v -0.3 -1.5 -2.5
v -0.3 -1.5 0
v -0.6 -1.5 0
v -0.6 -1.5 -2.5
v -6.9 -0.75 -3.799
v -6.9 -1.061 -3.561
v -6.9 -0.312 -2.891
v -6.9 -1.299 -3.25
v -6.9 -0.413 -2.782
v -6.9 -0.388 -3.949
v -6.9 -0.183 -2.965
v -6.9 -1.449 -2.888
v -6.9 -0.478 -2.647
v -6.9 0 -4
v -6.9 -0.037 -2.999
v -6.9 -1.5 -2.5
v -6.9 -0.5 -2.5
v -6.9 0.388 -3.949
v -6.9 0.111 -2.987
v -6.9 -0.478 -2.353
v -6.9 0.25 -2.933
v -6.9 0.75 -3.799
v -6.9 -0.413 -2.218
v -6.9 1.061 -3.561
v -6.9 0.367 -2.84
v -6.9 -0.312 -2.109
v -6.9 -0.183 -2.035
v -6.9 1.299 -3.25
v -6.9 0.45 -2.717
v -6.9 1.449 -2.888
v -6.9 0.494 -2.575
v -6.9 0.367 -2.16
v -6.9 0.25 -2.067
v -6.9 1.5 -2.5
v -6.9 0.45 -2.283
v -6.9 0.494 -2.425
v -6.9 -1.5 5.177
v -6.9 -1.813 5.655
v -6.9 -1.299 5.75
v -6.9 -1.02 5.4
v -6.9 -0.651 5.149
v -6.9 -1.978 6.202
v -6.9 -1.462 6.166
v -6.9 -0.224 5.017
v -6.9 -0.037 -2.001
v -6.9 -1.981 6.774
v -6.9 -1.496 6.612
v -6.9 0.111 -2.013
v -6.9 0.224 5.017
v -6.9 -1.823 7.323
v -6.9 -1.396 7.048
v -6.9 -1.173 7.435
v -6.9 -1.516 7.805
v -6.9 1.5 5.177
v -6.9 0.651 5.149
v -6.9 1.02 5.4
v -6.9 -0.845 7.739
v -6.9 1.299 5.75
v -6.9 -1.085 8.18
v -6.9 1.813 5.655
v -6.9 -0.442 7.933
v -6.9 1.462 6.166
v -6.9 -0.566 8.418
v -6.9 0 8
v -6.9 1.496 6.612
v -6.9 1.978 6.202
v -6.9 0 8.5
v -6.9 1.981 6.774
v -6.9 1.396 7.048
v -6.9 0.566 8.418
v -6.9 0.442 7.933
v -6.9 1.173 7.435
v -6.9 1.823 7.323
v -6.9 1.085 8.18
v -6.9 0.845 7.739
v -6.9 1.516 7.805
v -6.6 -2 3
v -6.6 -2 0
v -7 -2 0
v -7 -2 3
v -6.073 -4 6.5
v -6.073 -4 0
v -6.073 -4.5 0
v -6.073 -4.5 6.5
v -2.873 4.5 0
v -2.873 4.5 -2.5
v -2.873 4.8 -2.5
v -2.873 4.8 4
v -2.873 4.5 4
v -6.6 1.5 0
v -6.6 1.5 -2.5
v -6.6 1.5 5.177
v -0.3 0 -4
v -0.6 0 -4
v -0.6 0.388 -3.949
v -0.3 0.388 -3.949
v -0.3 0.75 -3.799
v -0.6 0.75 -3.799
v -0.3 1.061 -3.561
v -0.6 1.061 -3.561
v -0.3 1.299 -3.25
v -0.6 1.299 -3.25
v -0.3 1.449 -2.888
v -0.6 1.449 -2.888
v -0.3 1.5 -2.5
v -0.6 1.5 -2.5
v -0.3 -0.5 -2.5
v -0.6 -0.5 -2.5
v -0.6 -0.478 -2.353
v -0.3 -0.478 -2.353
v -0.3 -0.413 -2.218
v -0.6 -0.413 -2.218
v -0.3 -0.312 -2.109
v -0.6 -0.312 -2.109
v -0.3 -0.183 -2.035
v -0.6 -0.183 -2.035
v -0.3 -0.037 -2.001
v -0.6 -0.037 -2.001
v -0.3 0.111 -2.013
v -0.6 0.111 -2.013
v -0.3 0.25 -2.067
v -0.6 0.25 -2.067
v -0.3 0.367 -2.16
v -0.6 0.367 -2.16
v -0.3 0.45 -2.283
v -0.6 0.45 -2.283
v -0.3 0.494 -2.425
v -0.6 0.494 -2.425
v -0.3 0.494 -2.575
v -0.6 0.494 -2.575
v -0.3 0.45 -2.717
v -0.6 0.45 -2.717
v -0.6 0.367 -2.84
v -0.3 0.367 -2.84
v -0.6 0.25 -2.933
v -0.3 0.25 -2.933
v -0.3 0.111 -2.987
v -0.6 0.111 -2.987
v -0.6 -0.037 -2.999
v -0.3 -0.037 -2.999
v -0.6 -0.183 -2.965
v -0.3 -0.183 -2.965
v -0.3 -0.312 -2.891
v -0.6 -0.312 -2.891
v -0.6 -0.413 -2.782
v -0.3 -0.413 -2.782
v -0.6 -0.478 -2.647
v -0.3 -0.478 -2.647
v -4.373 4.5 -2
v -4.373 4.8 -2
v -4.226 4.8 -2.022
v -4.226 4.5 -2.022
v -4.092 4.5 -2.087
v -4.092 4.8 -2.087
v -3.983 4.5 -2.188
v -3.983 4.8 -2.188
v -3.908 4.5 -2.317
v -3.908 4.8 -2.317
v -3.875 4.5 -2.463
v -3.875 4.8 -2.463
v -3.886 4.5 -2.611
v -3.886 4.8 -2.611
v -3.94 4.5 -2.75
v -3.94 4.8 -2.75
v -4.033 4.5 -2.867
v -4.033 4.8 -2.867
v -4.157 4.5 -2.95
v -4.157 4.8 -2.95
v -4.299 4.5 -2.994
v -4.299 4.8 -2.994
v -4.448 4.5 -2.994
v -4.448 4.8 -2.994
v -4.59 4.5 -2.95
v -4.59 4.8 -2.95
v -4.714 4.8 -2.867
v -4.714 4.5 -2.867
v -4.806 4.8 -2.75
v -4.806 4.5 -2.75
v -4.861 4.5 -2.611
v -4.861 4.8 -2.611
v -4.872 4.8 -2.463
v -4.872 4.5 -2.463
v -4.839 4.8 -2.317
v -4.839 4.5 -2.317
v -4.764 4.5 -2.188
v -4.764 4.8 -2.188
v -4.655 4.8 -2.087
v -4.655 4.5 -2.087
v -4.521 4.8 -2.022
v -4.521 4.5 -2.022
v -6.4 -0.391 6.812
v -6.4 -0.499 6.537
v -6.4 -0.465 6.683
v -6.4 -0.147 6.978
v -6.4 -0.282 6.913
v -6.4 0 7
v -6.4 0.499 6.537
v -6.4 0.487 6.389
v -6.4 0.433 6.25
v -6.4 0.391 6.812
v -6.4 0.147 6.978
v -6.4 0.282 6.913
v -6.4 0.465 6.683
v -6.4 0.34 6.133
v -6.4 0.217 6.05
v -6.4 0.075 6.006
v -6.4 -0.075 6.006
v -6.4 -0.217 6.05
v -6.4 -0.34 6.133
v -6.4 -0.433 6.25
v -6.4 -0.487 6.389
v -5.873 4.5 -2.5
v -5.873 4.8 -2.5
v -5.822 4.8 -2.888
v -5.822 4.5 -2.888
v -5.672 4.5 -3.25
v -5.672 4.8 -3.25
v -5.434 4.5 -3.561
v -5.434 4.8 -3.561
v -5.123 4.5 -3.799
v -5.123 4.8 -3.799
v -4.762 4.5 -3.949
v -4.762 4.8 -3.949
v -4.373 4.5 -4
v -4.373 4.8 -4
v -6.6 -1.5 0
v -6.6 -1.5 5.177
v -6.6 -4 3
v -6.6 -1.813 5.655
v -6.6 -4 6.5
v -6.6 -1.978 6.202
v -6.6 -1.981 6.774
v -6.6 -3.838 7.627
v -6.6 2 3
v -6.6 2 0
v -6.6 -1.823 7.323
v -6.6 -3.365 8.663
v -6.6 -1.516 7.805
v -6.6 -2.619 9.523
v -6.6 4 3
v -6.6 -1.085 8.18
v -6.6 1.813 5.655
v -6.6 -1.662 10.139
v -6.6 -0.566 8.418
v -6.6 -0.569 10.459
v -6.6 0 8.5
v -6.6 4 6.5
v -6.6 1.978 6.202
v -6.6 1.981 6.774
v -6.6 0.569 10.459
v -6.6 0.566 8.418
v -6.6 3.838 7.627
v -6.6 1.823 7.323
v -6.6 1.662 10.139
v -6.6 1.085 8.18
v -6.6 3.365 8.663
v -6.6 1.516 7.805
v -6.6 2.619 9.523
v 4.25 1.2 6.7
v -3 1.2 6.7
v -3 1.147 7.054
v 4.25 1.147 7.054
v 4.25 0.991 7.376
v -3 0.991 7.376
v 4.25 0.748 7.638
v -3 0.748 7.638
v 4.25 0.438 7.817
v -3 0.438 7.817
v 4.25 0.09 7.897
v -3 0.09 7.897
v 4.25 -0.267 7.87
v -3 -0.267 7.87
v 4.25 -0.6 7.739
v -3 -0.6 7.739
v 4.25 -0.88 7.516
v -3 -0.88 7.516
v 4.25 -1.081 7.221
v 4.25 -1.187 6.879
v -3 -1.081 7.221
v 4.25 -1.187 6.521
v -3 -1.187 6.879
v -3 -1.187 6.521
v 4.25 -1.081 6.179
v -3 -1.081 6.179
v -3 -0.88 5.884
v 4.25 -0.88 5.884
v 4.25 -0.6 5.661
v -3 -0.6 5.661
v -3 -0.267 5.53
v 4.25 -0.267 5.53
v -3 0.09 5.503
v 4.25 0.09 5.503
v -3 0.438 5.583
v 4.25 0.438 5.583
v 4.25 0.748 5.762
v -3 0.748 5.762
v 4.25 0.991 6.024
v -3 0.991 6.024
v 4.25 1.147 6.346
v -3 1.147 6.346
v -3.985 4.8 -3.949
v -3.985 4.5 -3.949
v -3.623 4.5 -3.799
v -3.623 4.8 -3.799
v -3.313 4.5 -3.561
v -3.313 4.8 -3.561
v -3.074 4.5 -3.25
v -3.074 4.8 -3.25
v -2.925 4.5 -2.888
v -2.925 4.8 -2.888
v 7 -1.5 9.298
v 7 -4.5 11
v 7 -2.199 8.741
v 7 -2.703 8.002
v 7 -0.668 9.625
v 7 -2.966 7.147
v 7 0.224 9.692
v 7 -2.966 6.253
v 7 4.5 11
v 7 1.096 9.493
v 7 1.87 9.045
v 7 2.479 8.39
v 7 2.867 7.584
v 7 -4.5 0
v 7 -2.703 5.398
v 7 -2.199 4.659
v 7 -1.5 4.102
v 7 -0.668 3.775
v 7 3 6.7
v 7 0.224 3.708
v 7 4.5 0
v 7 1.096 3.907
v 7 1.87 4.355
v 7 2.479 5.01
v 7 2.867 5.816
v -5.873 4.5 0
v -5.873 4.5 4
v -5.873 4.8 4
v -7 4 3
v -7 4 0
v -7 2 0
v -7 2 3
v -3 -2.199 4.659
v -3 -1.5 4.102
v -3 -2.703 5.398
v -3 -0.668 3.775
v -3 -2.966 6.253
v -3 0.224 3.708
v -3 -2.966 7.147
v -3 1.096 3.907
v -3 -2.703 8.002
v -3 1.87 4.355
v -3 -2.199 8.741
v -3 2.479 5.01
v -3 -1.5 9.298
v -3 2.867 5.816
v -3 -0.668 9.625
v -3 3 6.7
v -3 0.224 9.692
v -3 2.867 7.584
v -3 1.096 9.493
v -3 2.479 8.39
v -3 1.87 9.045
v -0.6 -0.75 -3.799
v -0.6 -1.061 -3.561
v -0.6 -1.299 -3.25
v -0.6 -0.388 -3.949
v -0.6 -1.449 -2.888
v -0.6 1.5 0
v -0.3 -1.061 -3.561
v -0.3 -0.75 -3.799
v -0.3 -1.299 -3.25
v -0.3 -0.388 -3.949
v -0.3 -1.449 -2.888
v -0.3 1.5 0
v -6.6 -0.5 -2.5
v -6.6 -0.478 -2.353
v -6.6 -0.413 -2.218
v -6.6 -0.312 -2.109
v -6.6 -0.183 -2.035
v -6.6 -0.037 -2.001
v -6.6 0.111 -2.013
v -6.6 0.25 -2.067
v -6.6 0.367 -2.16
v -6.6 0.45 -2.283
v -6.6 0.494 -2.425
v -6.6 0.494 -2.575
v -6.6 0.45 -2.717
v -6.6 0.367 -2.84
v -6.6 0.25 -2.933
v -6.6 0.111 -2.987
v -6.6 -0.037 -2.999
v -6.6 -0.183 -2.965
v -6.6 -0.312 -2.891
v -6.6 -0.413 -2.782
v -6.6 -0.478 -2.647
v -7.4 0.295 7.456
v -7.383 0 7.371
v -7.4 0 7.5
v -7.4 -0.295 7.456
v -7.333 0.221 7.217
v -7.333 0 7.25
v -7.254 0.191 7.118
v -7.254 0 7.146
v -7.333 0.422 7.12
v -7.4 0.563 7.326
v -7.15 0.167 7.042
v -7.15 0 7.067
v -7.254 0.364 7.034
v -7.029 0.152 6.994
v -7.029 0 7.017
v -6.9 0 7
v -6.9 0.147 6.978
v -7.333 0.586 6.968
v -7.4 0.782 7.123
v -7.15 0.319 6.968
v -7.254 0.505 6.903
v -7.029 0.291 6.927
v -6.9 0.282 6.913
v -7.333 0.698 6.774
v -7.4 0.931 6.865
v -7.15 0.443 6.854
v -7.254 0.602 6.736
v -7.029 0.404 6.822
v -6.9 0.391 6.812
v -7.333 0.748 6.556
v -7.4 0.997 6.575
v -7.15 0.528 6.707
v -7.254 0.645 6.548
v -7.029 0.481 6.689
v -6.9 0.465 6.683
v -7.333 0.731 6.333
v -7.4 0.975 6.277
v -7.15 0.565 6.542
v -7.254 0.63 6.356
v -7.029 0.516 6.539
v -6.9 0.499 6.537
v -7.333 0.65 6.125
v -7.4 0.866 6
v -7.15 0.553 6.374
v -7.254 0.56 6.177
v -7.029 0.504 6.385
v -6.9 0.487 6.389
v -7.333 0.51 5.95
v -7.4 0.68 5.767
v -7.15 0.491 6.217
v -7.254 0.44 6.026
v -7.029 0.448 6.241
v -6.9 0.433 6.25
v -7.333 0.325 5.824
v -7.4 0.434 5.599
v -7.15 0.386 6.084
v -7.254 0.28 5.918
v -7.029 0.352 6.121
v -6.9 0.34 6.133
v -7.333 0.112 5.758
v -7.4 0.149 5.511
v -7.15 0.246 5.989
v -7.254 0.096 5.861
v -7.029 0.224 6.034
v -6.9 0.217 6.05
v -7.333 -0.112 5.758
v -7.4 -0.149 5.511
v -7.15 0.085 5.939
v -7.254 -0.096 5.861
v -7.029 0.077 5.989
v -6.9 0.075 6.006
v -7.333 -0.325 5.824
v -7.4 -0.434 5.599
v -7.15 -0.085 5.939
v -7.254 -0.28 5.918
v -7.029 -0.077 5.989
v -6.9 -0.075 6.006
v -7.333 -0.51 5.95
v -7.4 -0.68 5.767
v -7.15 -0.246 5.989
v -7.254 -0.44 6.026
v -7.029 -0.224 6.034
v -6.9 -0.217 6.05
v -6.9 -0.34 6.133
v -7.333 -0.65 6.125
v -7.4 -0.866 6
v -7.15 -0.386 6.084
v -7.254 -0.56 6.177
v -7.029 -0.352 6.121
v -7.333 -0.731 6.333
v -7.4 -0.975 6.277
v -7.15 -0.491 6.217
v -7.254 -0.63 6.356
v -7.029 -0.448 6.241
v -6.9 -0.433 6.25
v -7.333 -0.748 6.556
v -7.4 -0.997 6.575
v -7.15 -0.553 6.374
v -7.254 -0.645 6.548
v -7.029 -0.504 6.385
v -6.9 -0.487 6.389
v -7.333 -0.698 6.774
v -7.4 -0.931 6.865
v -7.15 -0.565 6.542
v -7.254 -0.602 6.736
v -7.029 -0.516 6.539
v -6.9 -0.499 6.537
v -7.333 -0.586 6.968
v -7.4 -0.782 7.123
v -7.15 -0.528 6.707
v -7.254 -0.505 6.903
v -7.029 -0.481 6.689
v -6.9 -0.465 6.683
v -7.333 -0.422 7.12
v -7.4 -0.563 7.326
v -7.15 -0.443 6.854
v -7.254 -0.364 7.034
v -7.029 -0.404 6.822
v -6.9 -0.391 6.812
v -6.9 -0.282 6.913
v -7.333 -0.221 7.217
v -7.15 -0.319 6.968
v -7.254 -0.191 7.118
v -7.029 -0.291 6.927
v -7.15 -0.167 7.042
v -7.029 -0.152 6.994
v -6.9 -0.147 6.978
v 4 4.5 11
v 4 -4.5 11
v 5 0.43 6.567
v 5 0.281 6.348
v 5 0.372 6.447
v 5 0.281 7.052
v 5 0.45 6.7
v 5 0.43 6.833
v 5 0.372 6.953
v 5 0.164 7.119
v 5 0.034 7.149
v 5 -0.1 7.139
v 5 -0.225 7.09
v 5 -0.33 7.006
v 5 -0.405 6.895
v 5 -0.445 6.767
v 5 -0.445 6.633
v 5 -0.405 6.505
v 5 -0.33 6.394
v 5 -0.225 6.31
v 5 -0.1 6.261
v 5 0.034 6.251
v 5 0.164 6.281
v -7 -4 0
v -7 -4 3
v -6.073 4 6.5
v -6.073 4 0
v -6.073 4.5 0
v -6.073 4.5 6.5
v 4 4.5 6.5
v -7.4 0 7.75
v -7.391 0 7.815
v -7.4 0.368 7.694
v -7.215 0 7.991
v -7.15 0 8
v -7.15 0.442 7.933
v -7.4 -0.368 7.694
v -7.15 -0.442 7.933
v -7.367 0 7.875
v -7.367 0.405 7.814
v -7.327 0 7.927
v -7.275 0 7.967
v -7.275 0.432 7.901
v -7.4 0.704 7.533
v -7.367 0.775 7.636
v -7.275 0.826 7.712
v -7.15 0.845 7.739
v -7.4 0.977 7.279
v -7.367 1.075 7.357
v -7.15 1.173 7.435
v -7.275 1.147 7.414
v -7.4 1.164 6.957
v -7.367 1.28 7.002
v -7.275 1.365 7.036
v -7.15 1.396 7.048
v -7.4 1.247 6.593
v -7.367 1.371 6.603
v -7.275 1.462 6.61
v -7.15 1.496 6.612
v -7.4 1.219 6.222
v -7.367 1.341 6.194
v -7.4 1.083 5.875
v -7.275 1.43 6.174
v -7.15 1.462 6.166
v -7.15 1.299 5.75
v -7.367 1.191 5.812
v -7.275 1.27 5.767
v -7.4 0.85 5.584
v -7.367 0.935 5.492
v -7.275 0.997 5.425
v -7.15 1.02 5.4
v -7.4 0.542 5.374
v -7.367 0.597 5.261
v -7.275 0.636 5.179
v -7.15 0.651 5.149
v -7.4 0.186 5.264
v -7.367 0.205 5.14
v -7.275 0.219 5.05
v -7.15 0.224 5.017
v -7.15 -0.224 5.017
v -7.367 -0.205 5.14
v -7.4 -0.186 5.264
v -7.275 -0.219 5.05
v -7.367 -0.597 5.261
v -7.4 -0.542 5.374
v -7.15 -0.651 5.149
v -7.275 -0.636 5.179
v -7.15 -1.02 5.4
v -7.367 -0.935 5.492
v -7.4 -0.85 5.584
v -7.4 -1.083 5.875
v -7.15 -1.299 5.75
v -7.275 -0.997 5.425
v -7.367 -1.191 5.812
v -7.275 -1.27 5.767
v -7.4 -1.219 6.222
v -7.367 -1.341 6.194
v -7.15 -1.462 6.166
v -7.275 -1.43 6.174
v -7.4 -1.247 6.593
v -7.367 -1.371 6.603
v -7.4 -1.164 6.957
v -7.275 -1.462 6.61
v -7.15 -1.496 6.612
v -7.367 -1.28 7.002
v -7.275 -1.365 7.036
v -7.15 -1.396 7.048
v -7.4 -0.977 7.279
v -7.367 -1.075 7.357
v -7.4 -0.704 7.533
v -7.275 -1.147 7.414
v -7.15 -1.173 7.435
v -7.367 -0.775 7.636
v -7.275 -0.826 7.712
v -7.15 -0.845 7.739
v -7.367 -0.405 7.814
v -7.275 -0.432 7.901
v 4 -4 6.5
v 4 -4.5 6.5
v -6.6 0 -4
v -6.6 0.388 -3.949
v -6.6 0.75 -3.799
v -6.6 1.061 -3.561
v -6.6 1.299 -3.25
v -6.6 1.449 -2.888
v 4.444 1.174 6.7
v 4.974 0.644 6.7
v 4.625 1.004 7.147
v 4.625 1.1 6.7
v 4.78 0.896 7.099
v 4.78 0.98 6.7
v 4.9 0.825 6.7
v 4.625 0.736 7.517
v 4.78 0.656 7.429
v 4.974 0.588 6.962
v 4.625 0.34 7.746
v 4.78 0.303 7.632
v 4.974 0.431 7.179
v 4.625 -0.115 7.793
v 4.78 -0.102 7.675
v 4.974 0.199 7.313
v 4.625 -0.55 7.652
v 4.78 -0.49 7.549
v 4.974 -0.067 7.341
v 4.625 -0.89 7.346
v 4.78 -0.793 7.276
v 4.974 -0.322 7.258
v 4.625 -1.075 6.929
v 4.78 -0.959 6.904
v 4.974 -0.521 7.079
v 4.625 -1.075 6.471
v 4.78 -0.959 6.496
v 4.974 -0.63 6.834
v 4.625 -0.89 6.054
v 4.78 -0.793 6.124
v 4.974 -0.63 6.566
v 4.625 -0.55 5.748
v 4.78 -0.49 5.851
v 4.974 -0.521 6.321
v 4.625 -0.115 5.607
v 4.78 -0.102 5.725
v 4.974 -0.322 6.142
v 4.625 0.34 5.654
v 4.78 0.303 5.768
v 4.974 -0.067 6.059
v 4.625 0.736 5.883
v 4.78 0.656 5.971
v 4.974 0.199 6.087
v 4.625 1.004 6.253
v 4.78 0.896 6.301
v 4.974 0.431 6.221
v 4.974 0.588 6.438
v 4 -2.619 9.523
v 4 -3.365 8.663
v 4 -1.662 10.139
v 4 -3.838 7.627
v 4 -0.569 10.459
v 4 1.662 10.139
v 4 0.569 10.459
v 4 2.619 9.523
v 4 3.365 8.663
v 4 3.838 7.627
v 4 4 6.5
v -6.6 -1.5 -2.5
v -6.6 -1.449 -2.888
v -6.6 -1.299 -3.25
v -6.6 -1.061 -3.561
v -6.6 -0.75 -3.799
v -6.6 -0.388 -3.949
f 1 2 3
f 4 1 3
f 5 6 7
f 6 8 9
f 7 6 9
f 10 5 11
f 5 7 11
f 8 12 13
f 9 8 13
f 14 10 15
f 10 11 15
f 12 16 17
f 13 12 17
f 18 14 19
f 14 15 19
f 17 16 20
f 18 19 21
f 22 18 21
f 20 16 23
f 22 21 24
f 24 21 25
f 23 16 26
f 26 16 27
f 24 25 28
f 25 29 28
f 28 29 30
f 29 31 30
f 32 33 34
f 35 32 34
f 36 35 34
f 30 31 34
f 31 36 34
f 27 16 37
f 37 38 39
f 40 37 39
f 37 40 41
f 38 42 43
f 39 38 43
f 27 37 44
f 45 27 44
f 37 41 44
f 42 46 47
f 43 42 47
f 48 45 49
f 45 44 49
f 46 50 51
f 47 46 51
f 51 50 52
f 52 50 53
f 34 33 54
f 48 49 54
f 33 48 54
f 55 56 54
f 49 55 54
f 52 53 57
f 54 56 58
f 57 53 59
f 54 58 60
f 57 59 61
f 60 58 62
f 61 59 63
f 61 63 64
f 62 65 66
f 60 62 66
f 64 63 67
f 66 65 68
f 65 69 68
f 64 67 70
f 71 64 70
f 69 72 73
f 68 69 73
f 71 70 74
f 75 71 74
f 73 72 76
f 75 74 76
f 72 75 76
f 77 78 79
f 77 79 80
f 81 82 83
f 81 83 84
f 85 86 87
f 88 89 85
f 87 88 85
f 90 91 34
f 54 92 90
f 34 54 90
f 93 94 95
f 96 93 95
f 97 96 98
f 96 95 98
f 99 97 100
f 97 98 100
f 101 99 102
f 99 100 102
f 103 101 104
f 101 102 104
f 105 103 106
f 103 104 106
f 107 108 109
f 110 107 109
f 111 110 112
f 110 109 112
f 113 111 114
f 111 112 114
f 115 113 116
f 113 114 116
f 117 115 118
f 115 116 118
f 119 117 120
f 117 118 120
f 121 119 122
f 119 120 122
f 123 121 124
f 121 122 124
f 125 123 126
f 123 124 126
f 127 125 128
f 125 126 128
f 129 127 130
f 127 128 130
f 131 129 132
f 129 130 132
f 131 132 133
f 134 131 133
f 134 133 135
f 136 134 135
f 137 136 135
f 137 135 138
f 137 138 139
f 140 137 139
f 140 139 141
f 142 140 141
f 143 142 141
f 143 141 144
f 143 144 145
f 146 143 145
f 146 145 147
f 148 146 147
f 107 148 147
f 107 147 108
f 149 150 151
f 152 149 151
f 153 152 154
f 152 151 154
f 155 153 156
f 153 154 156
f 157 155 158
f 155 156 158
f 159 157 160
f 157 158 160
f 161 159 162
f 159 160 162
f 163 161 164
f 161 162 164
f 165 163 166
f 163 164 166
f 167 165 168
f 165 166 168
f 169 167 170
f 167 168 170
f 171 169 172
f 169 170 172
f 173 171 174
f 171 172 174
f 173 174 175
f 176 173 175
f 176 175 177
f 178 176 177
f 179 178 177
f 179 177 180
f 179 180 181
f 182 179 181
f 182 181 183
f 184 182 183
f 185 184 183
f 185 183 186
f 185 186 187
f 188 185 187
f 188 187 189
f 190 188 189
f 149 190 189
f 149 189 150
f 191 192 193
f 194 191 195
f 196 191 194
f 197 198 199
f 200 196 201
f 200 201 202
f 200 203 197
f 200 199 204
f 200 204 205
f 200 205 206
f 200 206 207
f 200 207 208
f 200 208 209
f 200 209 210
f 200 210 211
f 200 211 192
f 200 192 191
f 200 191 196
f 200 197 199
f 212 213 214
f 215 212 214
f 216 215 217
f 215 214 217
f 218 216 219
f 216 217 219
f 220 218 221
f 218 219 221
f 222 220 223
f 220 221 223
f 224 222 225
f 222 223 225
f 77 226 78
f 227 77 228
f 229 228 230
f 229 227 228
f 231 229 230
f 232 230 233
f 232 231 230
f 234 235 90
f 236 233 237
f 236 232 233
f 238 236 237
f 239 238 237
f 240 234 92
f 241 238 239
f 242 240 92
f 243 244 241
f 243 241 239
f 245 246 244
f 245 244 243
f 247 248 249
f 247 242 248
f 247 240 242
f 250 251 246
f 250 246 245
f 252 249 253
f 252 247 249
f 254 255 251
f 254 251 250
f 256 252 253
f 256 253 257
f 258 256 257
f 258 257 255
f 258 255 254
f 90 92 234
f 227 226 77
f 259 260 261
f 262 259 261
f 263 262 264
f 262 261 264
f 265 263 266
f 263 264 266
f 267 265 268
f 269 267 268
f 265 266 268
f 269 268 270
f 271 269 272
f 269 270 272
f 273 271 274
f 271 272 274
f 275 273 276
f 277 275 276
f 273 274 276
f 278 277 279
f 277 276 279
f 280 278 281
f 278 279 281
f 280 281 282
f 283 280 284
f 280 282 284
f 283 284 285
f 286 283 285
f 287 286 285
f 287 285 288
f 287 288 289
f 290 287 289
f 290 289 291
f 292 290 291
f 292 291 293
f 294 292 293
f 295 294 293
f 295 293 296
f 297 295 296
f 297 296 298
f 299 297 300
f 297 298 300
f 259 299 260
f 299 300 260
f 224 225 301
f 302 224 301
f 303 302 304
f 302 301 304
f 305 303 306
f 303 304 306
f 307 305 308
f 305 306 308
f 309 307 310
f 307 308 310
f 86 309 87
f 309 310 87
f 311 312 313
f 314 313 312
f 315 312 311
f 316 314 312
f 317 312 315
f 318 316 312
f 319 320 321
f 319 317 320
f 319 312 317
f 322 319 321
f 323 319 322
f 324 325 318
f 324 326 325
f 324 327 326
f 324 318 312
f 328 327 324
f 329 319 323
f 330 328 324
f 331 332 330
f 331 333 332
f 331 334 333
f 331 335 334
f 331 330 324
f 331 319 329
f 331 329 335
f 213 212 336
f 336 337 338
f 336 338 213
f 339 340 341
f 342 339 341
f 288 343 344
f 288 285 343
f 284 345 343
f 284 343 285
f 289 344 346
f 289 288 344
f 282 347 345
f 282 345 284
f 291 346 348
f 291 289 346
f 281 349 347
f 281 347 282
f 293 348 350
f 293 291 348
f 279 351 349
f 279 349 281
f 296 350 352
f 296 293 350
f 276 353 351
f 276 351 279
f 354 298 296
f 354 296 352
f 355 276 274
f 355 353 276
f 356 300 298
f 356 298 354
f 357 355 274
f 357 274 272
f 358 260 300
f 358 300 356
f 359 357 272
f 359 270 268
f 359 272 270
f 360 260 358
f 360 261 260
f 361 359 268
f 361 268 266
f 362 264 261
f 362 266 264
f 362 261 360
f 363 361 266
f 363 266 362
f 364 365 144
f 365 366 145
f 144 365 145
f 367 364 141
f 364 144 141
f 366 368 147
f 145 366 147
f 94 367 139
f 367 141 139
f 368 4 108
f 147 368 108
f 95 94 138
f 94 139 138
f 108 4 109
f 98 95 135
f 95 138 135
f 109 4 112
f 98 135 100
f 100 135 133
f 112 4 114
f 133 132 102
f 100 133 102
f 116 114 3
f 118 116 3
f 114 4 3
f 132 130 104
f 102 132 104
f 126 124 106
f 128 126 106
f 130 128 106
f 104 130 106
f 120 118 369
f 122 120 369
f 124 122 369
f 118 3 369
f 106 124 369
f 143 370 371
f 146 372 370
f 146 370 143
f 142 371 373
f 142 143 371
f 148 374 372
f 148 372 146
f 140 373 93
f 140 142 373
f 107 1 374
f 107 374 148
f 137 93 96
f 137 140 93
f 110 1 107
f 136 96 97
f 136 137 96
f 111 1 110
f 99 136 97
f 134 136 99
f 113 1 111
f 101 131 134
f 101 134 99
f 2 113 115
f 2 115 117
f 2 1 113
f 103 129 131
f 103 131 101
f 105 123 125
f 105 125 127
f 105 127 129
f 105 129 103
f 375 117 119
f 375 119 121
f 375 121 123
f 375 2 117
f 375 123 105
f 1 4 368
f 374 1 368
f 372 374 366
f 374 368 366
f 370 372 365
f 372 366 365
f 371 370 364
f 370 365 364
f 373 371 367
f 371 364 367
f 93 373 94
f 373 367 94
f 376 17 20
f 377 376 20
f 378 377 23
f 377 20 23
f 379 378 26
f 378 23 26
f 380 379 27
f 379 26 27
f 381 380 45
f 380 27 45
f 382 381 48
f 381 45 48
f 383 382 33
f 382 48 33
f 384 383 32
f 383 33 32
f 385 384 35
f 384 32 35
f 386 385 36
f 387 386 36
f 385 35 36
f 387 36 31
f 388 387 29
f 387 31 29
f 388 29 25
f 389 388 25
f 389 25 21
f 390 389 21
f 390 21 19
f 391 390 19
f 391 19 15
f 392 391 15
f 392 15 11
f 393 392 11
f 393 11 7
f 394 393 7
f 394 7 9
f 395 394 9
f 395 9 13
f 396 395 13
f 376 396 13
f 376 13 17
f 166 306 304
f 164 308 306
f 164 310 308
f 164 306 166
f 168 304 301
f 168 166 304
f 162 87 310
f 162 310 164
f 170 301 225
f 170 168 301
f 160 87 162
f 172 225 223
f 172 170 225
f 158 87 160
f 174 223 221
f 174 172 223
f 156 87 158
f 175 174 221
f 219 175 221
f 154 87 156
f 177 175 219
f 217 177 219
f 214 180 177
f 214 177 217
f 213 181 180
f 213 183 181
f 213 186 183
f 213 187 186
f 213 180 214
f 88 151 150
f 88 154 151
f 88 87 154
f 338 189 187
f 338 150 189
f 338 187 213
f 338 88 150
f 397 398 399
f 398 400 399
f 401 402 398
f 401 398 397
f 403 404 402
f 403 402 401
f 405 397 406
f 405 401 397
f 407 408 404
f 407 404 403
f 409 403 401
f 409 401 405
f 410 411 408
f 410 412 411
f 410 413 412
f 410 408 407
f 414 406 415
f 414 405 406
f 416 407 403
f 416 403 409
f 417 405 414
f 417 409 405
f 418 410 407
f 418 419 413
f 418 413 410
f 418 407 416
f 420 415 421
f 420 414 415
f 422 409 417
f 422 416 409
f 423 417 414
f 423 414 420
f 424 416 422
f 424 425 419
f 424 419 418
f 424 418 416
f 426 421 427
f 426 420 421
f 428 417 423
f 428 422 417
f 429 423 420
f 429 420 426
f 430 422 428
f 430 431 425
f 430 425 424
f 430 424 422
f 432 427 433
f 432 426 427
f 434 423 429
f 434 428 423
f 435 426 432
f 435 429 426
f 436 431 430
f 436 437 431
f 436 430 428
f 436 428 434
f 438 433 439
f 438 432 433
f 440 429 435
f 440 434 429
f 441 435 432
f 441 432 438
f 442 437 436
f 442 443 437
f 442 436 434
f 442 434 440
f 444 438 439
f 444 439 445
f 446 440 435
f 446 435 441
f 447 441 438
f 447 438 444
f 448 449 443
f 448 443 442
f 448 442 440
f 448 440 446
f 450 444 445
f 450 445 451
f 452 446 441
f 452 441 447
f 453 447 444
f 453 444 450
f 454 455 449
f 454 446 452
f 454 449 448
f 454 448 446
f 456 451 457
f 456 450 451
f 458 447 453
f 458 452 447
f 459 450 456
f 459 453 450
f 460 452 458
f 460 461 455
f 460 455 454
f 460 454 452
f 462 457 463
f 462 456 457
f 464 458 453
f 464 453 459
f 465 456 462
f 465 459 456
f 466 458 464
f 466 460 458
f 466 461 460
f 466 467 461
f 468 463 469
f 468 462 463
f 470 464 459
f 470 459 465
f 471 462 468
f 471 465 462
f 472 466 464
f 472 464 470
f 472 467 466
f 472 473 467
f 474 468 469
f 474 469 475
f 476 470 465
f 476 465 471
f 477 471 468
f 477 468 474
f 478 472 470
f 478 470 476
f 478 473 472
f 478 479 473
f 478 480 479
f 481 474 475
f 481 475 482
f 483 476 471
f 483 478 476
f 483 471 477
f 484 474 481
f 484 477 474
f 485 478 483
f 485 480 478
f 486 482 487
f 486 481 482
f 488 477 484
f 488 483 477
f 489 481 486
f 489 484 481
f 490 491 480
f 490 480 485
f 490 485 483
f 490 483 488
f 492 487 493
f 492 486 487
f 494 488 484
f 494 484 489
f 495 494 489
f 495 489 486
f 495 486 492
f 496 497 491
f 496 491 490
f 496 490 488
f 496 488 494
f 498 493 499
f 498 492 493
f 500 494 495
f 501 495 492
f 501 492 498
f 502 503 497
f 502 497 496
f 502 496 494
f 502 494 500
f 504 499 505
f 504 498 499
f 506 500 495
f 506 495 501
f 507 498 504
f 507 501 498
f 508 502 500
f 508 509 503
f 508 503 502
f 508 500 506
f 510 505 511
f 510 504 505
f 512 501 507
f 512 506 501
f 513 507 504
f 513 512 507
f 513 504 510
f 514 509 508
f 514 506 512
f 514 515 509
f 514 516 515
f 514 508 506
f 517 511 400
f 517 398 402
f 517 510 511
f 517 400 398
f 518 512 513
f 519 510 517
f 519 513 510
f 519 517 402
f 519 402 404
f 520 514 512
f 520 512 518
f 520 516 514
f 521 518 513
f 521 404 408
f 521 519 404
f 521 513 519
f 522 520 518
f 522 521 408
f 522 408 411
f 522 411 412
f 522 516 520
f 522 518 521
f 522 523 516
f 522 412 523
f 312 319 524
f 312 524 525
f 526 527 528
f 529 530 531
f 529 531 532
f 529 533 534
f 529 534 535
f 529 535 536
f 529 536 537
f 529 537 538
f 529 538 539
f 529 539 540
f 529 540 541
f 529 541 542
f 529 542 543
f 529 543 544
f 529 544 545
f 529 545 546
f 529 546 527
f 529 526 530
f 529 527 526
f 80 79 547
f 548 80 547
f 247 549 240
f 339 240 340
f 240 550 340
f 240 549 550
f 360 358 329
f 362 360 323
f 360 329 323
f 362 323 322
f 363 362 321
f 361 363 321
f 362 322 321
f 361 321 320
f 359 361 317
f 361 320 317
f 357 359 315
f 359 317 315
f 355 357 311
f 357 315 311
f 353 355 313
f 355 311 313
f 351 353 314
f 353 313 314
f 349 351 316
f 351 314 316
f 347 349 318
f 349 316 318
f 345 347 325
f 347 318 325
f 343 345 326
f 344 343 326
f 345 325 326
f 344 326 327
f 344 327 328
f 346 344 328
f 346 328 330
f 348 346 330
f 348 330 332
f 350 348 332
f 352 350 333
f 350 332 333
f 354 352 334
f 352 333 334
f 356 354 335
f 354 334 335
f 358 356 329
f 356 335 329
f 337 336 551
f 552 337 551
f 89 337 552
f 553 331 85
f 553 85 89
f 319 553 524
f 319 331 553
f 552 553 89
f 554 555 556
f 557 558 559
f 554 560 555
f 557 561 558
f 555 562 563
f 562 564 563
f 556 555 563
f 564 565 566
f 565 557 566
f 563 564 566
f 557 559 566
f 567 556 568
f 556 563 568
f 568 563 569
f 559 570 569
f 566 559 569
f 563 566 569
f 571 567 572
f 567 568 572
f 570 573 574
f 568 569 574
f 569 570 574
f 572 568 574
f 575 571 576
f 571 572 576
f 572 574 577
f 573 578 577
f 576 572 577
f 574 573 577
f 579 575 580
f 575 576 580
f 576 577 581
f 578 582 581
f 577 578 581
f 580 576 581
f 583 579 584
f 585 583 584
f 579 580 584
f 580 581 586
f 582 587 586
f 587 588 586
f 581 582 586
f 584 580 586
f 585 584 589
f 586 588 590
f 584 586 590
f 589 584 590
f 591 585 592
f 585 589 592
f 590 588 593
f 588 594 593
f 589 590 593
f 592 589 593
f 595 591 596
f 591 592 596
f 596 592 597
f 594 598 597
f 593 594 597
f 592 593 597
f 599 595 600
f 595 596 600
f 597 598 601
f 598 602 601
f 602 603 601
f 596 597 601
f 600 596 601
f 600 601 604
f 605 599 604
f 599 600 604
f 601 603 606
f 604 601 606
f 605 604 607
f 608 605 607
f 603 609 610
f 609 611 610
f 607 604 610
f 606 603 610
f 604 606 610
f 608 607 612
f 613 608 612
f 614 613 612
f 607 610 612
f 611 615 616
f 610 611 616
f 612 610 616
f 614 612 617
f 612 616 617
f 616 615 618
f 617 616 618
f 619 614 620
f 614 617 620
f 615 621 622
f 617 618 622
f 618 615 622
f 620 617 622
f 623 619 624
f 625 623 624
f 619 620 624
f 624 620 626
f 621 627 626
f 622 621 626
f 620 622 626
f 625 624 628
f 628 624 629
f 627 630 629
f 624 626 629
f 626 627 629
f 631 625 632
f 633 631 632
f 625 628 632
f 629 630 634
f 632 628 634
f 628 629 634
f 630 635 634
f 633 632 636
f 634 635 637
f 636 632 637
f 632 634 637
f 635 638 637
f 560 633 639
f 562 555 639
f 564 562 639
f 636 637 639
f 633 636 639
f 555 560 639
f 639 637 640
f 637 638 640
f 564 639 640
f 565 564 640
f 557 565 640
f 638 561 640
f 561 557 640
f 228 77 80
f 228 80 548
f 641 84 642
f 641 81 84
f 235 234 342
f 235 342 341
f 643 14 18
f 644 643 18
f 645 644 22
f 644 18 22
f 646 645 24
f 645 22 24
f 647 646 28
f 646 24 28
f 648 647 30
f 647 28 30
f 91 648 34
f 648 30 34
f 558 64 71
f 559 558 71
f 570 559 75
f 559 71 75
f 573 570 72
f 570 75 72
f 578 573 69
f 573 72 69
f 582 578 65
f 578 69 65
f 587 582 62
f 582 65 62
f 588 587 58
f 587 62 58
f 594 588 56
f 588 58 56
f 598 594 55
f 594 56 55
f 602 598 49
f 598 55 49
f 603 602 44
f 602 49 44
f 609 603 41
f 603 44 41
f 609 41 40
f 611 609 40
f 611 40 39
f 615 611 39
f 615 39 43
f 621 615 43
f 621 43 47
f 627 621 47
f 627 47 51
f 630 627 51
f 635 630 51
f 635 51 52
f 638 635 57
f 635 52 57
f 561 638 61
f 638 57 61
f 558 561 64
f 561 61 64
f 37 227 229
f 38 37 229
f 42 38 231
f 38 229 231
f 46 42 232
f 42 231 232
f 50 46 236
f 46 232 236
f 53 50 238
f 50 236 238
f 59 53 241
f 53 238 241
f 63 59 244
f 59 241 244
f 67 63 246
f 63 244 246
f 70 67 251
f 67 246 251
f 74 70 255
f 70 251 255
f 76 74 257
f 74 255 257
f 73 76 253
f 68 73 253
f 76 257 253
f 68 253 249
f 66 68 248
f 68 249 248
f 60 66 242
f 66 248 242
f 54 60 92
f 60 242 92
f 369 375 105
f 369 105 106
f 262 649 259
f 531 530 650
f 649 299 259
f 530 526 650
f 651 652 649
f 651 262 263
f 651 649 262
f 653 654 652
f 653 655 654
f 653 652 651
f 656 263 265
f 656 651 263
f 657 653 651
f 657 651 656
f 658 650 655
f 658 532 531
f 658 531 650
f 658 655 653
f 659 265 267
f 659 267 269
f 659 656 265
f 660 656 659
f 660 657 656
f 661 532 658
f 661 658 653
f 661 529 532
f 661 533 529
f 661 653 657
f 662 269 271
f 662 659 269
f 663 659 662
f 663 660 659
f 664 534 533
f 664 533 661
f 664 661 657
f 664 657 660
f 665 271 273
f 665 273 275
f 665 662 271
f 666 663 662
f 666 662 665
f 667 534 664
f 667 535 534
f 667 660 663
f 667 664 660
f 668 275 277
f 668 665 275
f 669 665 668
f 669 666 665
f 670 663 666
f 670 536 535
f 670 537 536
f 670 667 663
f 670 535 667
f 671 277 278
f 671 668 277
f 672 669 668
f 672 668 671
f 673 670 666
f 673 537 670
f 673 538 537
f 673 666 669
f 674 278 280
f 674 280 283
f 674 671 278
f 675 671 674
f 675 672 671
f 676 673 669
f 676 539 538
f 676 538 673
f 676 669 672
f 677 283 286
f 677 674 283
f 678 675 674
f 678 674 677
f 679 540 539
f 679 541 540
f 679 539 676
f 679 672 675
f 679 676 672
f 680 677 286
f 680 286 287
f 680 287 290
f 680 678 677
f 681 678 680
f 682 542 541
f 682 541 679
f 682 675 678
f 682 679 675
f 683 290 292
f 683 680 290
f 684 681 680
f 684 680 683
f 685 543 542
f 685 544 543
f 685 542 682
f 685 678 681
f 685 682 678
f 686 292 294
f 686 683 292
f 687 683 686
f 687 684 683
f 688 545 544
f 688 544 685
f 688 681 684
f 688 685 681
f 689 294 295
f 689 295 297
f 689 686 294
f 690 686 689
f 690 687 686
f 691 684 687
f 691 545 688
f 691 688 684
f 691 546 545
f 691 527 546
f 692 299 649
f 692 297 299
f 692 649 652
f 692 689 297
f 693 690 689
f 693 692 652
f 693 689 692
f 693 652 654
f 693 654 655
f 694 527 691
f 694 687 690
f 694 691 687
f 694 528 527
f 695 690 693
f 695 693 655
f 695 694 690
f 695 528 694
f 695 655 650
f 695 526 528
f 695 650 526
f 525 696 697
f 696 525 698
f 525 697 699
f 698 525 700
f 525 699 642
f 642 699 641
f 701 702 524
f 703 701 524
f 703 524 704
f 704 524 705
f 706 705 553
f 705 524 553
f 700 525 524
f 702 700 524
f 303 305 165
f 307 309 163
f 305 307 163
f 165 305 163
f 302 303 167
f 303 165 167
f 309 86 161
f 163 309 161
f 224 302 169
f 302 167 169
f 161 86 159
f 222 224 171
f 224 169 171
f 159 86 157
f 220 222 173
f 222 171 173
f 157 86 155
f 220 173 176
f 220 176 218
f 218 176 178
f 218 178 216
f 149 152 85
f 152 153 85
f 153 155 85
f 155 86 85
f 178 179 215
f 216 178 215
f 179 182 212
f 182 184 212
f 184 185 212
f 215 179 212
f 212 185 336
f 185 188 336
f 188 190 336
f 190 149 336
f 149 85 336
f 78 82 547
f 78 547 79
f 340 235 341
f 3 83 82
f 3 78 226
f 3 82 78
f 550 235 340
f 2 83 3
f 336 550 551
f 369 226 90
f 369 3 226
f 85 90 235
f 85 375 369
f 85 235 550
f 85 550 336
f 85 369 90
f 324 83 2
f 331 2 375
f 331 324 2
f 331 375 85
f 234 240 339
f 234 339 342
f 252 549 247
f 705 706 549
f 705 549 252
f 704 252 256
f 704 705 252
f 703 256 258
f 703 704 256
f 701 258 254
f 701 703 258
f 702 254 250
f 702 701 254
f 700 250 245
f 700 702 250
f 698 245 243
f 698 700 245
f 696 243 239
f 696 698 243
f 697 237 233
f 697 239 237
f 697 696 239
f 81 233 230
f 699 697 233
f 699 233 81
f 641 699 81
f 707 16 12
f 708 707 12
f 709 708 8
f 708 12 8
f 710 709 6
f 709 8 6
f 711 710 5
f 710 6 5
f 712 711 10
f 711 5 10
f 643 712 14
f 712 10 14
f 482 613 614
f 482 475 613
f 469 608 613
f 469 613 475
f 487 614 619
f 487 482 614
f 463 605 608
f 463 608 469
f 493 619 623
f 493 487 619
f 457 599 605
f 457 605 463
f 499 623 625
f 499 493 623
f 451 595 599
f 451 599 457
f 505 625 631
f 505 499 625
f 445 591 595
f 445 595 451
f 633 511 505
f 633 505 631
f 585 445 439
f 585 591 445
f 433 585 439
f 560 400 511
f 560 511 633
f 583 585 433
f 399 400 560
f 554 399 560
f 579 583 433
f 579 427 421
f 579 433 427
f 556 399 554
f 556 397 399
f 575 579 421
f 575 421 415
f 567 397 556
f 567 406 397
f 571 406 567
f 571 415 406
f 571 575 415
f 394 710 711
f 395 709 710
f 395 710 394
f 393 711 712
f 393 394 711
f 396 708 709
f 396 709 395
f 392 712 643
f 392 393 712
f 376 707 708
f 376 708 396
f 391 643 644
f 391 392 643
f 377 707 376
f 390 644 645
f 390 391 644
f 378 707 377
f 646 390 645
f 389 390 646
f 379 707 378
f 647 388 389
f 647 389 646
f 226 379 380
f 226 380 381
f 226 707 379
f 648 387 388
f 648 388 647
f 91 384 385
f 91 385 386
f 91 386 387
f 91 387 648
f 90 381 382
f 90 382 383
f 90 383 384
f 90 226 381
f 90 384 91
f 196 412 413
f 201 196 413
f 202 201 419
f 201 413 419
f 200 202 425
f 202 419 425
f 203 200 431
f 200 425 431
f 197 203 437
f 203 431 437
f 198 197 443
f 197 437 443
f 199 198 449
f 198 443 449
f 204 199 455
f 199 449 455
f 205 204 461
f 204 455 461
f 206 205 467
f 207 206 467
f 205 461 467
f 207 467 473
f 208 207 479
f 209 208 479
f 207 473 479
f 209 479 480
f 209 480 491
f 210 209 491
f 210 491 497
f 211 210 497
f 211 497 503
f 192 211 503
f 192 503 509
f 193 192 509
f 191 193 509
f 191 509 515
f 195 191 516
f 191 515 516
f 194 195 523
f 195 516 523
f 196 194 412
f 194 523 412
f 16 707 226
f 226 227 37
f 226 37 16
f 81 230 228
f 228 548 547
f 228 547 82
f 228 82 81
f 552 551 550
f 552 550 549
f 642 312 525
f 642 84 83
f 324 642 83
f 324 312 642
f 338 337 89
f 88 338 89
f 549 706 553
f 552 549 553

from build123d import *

# Parameters (mm, degrees)
BOSS_EXTRUDE1_DEPTH  = 6.5
BOSS_EXTRUDE2_REACH  = 18.078
SKETCH2_R            = 4
BOSS_EXTRUDE3_DEPTH  = 3
CUT_EXTRUDE1_START   = -0.4
CUT_EXTRUDE1_DEPTH   = 0.4
SKETCH5_W            = 3
SKETCH5_H            = 4
BOSS_EXTRUDE4_DEPTH  = 0.3
SKETCH6_W            = 3
SKETCH6_H            = 0.3
BOSS_EXTRUDE5_DEPTH  = 4
SKETCH7_R            = 0.5
CUT_EXTRUDE4_DEPTH   = 17.01530518
SKETCH8_W            = 6.5
SKETCH8_H            = 0.5
BOSS_EXTRUDE6_DEPTH  = 0.2
BOSS_EXTRUDE7_DEPTH  = 0.3
SKETCH10_W           = 0.3
SKETCH10_H           = 3
BOSS_EXTRUDE8_DEPTH  = 4
SKETCH12_W           = 0.3
SKETCH12_H           = 3
BOSS_EXTRUDE9_DEPTH  = 4
SKETCH11_R           = 0.5
CUT_EXTRUDE5_DEPTH   = 19.364367672
SKETCH13_R           = 3
CUT_EXTRUDE6_DEPTH   = 10
SKETCH14_R           = 1.5
BOSS_EXTRUDE10_DEPTH = 0.5
SKETCH15_R           = 0.5
CUT_EXTRUDE7_DEPTH   = 1
FILLET1_R            = 0.5
FILLET2_R            = 0.25
SKETCH16_R           = 1.2
BOSS_EXTRUDE11_DEPTH = 8
FILLET4_R            = 0.75


with BuildPart() as part:
    # Sketch1 → Boss-Extrude1 (new body)
    with BuildSketch(Plane.XY):
        Polygon((7, 4.5), (-5.873443246, 4.5), (-5.873443246, 4), (-7, 4), (-7, -4), (-5.873443246, -4), (-5.873443246, -4.5), (7, -4.5), align=None)
    extrude(amount=BOSS_EXTRUDE1_DEPTH)

    # Boss-Extrude2: up to this face of the body (flat: up to its plane)
    boss_extrude2_end = Plane(part.part.faces().sort_by_distance((-7, 0, 3.25))[0])
    # Sketch2 → Boss-Extrude2 (add, up to the picked face)
    with BuildSketch(Plane(origin=(7, 0, 0), x_dir=(0, 0, -1), z_dir=(1, 0, 0)), mode=Mode.PRIVATE) as boss_extrude2_sk1:
        with Locations((-6.5, 0)):
            Circle(SKETCH2_R)
    boss_extrude2_tool1 = split(extrude(boss_extrude2_sk1.sketch, amount=-BOSS_EXTRUDE2_REACH, mode=Mode.PRIVATE), bisect_by=boss_extrude2_end, keep=Keep.BOTH, mode=Mode.PRIVATE)
    add(boss_extrude2_tool1.solids().sort_by(Axis((7, 0, 6.5), (-1, 0, 0)))[0])

    # Sketch3 → Boss-Extrude3 (add)
    with BuildSketch(Plane(origin=(7, 0, 0), x_dir=(0, 0, -1), z_dir=(1, 0, 0))):
        with BuildLine():
            Line((-11, -4.5), (-6.5, -4.5))
            Line((-6.5, -4.5), (-6.5, -4))
            ThreePointArc((-6.5, -4), (-10.5, 0), (-6.5, 4))
            Line((-6.5, 4), (-6.5, 4.5))
            Line((-6.5, 4.5), (-11, 4.5))
            Line((-11, 4.5), (-11, 0.782604766))
            Line((-11, 0.782604766), (-11, -4.5))
        make_face()
    extrude(amount=-BOSS_EXTRUDE3_DEPTH)

    # Sketch4 → Cut-Extrude1 (cut)
    with BuildSketch(Plane.ZY.offset(7).offset(CUT_EXTRUDE1_START)):
        with BuildLine():
            Line((3, 4), (3, 2))
            Line((3, 2), (0, 2))
            Line((0, 2), (0, -2))
            Line((0, -2), (3, -2))
            Line((3, -2), (3, -4))
            Line((3, -4), (6.5, -4))
            ThreePointArc((6.5, -4), (10.5, 0), (6.5, 4))
            Line((6.5, 4), (3, 4))
        make_face()
    extrude(amount=CUT_EXTRUDE1_DEPTH, mode=Mode.SUBTRACT)

    # Sketch5 → Boss-Extrude4 (add)
    with BuildSketch(Plane(origin=(0, 4.5, 0), x_dir=(1, 0, 0), z_dir=(0, 1, 0))):
        with Locations((-4.373443246, -2)):
            Rectangle(SKETCH5_W, SKETCH5_H)
    extrude(amount=BOSS_EXTRUDE4_DEPTH)

    # Sketch6 → Boss-Extrude5 (add)
    with BuildSketch(Plane(origin=(0, 0, 0), x_dir=(-1, 0, 0), z_dir=(0, 0, -1))):
        with Locations((4.373443246, 4.65)):
            Rectangle(SKETCH6_W, SKETCH6_H)
    extrude(amount=BOSS_EXTRUDE5_DEPTH)

    # Sketch7 → Cut-Extrude4 (cut, through all)
    with BuildSketch(Plane(origin=(0, 4.8, 0), x_dir=(1, 0, 0), z_dir=(0, 1, 0))):
        with Locations(Location((-4.373443246, 2.5, 0), (0, 0, 270))):
            Circle(SKETCH7_R)
        with BuildLine():
            Line((-5.873443246, 4), (-5.873443246, 2.5))
            ThreePointArc((-5.873443246, 2.5), (-5.434103418, 3.560660172), (-4.373443246, 4))
            Line((-4.373443246, 4), (-5.873443246, 4))
        make_face()
        with BuildLine():
            Line((-2.873443246, 4), (-4.373443246, 4))
            ThreePointArc((-4.373443246, 4), (-3.312783074, 3.560660172), (-2.873443246, 2.5))
            Line((-2.873443246, 2.5), (-2.873443246, 4))
        make_face()
    extrude(amount=-CUT_EXTRUDE4_DEPTH, mode=Mode.SUBTRACT)

    # Sketch8 → Boss-Extrude6 (add)
    with BuildSketch(Plane.ZY.offset(5.873443246)):
        with Locations((3.25, 4.25)):
            Rectangle(SKETCH8_W, SKETCH8_H)
        with Locations((3.25, -4.25)):
            Rectangle(SKETCH8_W, SKETCH8_H)
    extrude(amount=BOSS_EXTRUDE6_DEPTH)

    # Sketch9 → Boss-Extrude7 (add)
    with BuildSketch(Plane.ZY.offset(6.6)):
        with BuildLine():
            Line((5.177124344, 1.5), (0, 1.5))
            Line((0, 1.5), (0, -1.5))
            Line((0, -1.5), (5.177124344, -1.5))
            ThreePointArc((5.177124344, -1.5), (8.5, 0), (5.177124344, 1.5))
        make_face()
    extrude(amount=BOSS_EXTRUDE7_DEPTH)

    # Sketch10 → Boss-Extrude8 (add)
    with BuildSketch(Plane(origin=(0, 0, 0), x_dir=(-1, 0, 0), z_dir=(0, 0, -1))):
        with Locations((6.75, 0)):
            Rectangle(SKETCH10_W, SKETCH10_H)
    extrude(amount=BOSS_EXTRUDE8_DEPTH)

    # Sketch12 → Boss-Extrude9 (add)
    with BuildSketch(Plane(origin=(0, 0, 0), x_dir=(-1, 0, 0), z_dir=(0, 0, -1))):
        with Locations((0.45, 0)):
            Rectangle(SKETCH12_W, SKETCH12_H)
    extrude(amount=BOSS_EXTRUDE9_DEPTH)

    # Sketch11 → Cut-Extrude5 (cut, through all)
    with BuildSketch(Plane.ZY.offset(6.9)):
        with Locations(Location((-2.5, 0, 0), (0, 0, 270))):
            Circle(SKETCH11_R)
        with BuildLine():
            Line((-2.5, 1.5), (-4, 1.5))
            Line((-4, 1.5), (-4, 0))
            ThreePointArc((-4, 0), (-3.560660172, 1.060660172), (-2.5, 1.5))
        make_face()
        with BuildLine():
            ThreePointArc((-2.5, -1.5), (-3.560660172, -1.060660172), (-4, 0))
            Line((-4, 0), (-4, -1.5))
            Line((-4, -1.5), (-2.5, -1.5))
        make_face()
    extrude(amount=-CUT_EXTRUDE5_DEPTH, mode=Mode.SUBTRACT)

    # Sketch13 → Cut-Extrude6 (cut)
    with BuildSketch(Plane(origin=(7, 0, 0), x_dir=(0, 0, -1), z_dir=(1, 0, 0))):
        with Locations(Location((-6.7, 0, 0), (0, 0, 90))):
            Circle(SKETCH13_R)
    extrude(amount=-CUT_EXTRUDE6_DEPTH, mode=Mode.SUBTRACT)

    # Sketch14 → Boss-Extrude10 (add)
    with BuildSketch(Plane.ZY.offset(6.9)):
        with Locations((6.5, 0)):
            Circle(SKETCH14_R)
    extrude(amount=BOSS_EXTRUDE10_DEPTH)

    # Sketch15 → Cut-Extrude7 (cut)
    with BuildSketch(Plane.ZY.offset(7.4)):
        with Locations((6.5, 0)):
            Circle(SKETCH15_R)
    extrude(amount=-CUT_EXTRUDE7_DEPTH, mode=Mode.SUBTRACT)

    # Fillet1
    fillet1_edges = [part.edges().sort_by_distance(p)[0] for p in [
        (-7.4, 0, 6),
    ]]
    fillet(fillet1_edges, radius=FILLET1_R)

    # Fillet2
    fillet2_edges = [part.edges().sort_by_distance(p)[0] for p in [
        (-7.4, 0, 5),
    ]]
    fillet(fillet2_edges, radius=FILLET2_R)

    # Sketch16 → Boss-Extrude11 (add)
    with BuildSketch(Plane(origin=(-3, 0, 0), x_dir=(0, 0, -1), z_dir=(1, 0, 0))):
        with Locations(Location((-6.7, 0, 0), (0, 0, 90))):
            Circle(SKETCH16_R)
    extrude(amount=BOSS_EXTRUDE11_DEPTH)

    # Fillet4
    fillet4_edges = [part.edges().sort_by_distance(p)[0] for p in [
        (5, -1.2, 6.7),
    ]]
    fillet(fillet4_edges, radius=FILLET4_R)


solid = part.part
